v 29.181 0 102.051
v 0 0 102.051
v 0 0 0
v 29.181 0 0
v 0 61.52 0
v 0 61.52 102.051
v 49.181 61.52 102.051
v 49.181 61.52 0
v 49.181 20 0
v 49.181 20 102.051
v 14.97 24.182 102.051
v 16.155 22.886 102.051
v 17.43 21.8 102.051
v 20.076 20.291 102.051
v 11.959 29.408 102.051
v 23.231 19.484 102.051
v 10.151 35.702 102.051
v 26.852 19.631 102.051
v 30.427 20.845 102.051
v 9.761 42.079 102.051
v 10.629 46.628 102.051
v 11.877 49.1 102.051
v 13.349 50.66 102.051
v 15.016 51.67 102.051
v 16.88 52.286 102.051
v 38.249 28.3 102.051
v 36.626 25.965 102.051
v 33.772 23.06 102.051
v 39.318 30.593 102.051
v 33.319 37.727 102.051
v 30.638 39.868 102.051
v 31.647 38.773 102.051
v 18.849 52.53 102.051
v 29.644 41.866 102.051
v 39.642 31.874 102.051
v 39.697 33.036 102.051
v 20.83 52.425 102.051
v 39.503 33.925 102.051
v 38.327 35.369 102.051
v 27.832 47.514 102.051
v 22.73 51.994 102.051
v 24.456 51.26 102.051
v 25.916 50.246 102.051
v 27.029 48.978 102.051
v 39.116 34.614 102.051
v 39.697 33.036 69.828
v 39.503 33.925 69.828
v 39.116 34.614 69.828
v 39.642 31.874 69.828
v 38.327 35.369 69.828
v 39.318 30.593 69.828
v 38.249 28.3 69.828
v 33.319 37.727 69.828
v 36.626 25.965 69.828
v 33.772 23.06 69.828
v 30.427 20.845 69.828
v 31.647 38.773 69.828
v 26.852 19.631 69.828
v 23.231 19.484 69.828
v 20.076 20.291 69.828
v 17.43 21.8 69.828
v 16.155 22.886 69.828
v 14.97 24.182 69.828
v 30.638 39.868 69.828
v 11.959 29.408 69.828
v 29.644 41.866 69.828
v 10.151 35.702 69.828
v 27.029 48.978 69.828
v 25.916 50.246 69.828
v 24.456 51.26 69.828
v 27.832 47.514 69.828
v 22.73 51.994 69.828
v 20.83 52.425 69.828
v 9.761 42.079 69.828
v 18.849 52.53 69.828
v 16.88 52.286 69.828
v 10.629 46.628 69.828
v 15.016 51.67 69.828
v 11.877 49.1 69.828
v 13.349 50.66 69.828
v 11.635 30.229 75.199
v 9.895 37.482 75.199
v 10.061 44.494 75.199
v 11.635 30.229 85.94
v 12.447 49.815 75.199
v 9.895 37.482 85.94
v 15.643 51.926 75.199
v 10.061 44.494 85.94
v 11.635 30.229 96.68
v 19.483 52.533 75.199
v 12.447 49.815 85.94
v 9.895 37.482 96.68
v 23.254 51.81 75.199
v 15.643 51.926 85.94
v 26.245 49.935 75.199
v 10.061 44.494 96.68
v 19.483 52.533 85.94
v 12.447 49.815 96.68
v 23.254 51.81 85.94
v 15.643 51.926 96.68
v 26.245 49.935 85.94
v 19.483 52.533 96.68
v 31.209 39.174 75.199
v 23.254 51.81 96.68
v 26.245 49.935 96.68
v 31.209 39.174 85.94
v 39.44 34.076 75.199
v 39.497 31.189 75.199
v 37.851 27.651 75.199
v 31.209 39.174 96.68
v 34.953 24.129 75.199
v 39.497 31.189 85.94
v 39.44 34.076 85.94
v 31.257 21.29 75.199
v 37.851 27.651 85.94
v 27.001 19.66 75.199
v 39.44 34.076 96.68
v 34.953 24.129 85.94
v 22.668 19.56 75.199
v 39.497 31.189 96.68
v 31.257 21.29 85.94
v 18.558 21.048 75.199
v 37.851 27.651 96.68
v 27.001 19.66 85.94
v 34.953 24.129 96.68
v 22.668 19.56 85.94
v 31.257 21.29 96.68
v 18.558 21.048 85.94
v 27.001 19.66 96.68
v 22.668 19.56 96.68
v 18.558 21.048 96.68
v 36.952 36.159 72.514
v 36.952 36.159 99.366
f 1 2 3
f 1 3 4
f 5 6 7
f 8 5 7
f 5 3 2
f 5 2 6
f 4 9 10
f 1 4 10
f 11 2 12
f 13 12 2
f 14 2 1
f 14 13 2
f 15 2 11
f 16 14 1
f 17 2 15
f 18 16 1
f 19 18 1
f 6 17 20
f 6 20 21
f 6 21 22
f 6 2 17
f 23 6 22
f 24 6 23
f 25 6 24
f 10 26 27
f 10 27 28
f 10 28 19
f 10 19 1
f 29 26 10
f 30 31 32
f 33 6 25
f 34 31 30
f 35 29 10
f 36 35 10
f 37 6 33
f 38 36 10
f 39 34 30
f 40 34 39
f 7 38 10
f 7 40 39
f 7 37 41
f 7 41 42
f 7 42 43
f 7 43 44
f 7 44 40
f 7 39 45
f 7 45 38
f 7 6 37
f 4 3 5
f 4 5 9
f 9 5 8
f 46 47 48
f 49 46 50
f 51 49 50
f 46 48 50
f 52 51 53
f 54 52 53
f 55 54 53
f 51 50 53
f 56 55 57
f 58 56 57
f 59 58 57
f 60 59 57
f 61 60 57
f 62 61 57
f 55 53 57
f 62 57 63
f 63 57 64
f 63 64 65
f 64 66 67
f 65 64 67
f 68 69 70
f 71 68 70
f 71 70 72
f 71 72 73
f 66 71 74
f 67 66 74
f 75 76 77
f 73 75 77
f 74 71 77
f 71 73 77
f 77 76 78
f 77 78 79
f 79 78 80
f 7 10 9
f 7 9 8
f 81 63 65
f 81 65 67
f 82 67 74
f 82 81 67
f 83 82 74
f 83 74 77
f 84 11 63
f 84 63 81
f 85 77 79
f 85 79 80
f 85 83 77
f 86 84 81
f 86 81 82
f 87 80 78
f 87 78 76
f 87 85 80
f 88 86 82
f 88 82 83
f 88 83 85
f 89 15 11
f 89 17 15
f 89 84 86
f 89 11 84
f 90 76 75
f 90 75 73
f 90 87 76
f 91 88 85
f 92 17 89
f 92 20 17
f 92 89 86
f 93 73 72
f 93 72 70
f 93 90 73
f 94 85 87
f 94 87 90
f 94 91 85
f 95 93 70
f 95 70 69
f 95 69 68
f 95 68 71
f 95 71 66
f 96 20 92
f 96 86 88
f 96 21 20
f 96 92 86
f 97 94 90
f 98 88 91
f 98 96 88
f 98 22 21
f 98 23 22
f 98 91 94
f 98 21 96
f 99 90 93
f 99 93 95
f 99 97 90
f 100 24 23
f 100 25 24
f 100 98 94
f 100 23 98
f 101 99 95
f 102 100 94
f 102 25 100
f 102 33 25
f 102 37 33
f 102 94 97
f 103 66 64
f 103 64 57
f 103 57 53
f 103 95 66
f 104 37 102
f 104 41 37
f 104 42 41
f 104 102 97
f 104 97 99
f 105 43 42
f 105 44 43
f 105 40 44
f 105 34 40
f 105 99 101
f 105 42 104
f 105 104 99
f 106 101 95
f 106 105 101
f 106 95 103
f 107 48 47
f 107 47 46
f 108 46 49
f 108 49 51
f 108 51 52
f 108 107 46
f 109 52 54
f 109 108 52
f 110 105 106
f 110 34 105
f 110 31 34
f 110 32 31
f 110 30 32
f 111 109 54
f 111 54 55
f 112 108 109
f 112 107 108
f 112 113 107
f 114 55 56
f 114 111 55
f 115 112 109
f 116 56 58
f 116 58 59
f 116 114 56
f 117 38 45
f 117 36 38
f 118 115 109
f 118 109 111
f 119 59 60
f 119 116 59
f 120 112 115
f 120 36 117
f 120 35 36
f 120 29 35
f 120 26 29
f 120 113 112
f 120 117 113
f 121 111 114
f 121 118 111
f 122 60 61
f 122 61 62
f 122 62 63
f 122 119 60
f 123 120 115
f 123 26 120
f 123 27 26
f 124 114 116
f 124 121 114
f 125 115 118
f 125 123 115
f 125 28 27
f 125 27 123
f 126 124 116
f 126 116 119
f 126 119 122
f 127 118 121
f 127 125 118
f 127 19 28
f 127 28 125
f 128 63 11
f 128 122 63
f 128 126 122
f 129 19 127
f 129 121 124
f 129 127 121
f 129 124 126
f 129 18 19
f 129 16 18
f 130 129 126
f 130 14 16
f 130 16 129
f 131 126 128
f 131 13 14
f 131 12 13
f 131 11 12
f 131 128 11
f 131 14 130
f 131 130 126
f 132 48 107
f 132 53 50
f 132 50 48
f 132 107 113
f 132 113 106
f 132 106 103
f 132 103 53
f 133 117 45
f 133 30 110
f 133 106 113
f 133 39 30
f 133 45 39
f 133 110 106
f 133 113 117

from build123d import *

# Parameters (mm, degrees)
F0_W     = 49.1812452674
F0_H     = 61.5196600556
F1_DEPTH = 102.0506862551
F2_SIZE  = 20
F4_DEPTH = 32.2221927345


with BuildPart() as f1:
    # F0 (on Top) → F1 (new body)
    with BuildSketch(Plane.XY):
        with Locations((24.5906226337, 30.7598300278)):
            Rectangle(F0_W, F0_H)
    extrude(amount=F1_DEPTH)

    # F2
    f2_edges = [f1.edges().sort_by_distance(p)[0] for p in [
        (49.181245, 0, 51.025343),
    ]]
    chamfer(f2_edges, length=F2_SIZE)

    # F3 (on face) → F4 (cut)
    with BuildSketch(Plane.XY.offset(102.0506862551)):
        with BuildLine():
            add(Edge.make_bspline(
                [(14.9697884917, 24.1816043854), (9.6009433452, 30.797334319), (6.214481847, 54.512284672), (29.7064583043, 52.5828474483), (28.205306037, 37.0892116051), (44.3171907964, 36.2556686485), (31.9890515151, 17.3984020192), (19.272394379, 18.8797419207), (14.9697884917, 24.1816043854)],
                knots=[0, 0, 0, 0, 0.2177502656, 0.3771252695, 0.5248314049, 0.6583289156, 0.8254943942, 1, 1, 1, 1], degree=3))
        make_face()
    extrude(amount=-F4_DEPTH, mode=Mode.SUBTRACT)


solid = f1.part
